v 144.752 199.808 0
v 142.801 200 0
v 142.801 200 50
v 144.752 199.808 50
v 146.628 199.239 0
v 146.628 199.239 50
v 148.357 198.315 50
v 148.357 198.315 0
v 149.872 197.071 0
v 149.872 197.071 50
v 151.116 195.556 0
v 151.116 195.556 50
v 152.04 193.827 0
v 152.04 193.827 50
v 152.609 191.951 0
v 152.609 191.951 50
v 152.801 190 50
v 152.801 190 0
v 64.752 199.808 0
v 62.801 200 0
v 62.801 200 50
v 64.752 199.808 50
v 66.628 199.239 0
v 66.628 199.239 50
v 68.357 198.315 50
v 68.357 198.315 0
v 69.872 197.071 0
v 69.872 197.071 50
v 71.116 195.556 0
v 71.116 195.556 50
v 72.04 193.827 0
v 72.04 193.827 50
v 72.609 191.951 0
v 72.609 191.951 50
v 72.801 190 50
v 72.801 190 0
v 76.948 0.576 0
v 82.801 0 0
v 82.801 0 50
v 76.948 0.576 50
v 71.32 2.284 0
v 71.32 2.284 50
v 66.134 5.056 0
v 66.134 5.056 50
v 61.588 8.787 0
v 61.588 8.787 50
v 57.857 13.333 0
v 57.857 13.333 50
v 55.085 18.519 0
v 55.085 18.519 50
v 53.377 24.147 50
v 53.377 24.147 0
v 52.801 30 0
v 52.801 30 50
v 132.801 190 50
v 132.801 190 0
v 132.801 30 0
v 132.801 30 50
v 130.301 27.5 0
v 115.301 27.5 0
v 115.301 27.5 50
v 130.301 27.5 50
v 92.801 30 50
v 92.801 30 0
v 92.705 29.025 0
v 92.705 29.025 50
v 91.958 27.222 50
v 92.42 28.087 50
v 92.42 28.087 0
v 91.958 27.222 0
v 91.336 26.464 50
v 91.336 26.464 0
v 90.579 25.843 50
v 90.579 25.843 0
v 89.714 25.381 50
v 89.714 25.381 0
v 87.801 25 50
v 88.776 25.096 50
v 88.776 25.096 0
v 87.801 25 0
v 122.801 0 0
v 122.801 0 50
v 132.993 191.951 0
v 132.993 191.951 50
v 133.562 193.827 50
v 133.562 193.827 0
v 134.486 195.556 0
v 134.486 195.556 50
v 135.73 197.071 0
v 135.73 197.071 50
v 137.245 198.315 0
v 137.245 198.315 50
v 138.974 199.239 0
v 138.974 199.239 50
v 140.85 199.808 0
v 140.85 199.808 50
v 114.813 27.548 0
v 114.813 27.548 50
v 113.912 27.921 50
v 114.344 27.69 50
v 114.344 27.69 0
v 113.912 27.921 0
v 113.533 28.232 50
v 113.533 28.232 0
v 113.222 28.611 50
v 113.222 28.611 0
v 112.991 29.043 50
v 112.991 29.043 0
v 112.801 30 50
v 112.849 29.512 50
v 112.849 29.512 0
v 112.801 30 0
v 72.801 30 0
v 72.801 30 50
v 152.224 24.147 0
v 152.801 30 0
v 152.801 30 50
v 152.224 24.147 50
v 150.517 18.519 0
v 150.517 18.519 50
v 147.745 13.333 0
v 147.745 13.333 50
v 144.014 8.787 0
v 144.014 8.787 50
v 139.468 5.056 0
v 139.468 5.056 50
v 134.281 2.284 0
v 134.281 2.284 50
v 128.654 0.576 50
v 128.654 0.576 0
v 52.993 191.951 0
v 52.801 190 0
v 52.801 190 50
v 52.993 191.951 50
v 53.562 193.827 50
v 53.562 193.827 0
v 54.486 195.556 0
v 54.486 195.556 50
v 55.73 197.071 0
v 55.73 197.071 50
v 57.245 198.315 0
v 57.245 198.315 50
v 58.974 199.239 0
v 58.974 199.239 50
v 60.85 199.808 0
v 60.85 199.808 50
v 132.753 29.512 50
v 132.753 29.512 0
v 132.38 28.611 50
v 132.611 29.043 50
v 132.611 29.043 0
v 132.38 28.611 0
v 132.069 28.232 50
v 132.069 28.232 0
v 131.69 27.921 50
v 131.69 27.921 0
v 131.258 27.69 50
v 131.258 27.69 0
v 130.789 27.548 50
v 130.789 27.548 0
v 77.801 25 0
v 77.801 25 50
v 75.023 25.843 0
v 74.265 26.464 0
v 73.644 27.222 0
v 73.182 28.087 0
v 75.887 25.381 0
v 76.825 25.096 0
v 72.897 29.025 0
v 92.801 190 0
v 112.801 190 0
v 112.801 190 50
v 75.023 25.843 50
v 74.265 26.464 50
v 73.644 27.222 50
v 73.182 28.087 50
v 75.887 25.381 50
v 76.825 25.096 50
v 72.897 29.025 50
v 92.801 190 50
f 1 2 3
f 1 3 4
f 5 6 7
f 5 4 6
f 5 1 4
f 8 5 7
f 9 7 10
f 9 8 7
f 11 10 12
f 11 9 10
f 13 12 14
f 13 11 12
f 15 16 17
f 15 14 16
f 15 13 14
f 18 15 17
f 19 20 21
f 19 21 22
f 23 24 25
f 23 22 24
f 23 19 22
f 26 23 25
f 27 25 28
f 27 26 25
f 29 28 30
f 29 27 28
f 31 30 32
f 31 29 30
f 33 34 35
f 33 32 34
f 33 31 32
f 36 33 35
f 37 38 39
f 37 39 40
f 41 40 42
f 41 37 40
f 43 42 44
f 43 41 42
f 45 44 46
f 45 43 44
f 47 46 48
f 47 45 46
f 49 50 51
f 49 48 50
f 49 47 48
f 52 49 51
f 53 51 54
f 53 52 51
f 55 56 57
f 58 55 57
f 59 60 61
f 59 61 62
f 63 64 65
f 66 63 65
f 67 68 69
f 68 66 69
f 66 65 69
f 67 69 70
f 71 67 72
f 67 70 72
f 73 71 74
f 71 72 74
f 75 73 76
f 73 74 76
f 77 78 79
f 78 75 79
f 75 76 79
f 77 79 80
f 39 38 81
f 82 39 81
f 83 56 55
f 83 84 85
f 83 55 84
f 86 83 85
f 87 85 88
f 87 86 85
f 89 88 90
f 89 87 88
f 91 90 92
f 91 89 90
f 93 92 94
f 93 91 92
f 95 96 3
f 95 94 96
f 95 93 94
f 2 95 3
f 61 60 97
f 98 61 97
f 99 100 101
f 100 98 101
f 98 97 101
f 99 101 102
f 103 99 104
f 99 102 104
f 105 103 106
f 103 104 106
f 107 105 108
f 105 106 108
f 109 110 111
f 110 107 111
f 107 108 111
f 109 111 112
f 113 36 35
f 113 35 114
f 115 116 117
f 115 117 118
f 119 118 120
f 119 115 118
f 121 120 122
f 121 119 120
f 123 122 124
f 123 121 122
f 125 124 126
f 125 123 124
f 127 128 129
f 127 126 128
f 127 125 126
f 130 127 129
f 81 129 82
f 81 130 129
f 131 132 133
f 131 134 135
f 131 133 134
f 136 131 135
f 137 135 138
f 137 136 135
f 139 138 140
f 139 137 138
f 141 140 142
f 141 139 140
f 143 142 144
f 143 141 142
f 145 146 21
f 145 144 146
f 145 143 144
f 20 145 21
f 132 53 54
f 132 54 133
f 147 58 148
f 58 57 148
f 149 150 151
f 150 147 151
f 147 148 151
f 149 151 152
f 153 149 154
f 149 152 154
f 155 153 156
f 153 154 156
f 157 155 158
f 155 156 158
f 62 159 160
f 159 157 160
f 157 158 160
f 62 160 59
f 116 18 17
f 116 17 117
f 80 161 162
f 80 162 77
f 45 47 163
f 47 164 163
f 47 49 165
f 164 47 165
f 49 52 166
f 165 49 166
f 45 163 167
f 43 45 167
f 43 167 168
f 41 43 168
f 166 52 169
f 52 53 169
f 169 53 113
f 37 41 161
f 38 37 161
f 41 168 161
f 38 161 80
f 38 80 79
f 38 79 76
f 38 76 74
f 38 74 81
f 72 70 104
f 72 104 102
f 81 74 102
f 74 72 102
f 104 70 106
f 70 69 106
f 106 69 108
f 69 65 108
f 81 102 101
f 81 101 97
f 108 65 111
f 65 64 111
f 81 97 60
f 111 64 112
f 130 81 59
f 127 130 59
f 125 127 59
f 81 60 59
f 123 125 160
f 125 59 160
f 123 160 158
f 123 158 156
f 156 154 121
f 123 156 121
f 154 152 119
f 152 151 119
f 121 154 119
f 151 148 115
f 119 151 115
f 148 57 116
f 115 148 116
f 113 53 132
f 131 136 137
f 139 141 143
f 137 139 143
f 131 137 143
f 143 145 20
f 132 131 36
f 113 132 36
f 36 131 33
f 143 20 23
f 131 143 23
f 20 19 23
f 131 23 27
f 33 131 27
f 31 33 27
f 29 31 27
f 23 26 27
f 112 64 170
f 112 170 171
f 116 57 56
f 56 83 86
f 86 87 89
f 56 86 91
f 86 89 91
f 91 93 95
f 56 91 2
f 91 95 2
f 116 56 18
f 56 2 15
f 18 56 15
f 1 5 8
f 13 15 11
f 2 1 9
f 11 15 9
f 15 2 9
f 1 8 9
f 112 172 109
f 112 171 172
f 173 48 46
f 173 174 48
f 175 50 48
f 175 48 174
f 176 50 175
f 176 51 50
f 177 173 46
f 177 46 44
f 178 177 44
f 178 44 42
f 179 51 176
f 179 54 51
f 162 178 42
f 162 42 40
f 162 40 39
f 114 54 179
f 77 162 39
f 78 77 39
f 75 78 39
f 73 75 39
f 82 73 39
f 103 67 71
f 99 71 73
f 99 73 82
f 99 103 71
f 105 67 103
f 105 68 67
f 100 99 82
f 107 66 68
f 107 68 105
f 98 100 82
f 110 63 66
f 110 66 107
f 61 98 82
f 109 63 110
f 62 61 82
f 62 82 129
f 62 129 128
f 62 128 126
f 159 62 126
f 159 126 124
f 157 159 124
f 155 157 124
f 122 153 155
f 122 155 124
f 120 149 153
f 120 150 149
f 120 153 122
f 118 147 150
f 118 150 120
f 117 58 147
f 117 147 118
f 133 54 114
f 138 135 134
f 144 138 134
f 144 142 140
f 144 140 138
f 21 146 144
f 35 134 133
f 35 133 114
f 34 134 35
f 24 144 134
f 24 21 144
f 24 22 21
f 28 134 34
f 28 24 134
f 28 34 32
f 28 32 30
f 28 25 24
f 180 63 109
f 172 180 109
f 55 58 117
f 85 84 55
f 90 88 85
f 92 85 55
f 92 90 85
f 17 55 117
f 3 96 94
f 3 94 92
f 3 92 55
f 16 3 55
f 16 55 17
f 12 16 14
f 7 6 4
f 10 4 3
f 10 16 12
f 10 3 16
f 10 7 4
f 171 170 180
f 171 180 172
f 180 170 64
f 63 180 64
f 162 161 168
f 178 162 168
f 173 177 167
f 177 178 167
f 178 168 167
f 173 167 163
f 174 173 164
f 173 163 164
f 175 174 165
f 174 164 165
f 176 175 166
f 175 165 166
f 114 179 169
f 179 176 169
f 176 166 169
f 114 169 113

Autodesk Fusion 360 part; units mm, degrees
sketch "Sketch1" plane through (0, 0, 0) normal (0, 0, 1) x (1, 0, 0)
  line L0 (0, 0) -> (200, 0)
  line L1 (200, 0) -> (200, 200)
  line L2 (200, 200) -> (0, 200)
  line L3 (0, 200) -> (0, 0)
  line L4 (52.8009, 30) -> (52.8009, 190)
  line L5 (72.8009, 190) -> (72.8009, 30)
  line L6 (112.8009, 190) -> (112.8009, 30)
  line L7 (132.8009, 190) -> (132.8009, 30)
  line L8 (152.8009, 190) -> (152.8009, 30)
  line L9 (52.8009, 190) -> (152.8009, 190) construction
  arc A0 (72.8009, 190) -> (52.8009, 190) centre (62.8009, 190) ccw
  arc A1 (152.8009, 190) -> (132.8009, 190) centre (142.8009, 190) ccw
  line L10 (92.8009, 190) -> (92.8009, 30)
  arc A2 (72.8009, 30) -> (92.8009, 30) centre (82.8009, 30) ccw construction
  arc A3 (112.8009, 30) -> (132.8009, 30) centre (122.8009, 30) ccw construction
  arc A4 (112.8009, 190) -> (92.8009, 190) centre (102.8009, 190) ccw construction
  arc A5 (52.8009, 30) -> (82.8009, 0) centre (82.8009, 30) ccw
  line L11 (92.8009, 190) -> (112.8009, 190)
  arc A6 (72.8009, 30) -> (77.8009, 25) centre (77.8009, 30) ccw
  arc A7 (87.8009, 25) -> (92.8009, 30) centre (87.8009, 30) ccw
  arc A8 (112.8009, 30) -> (115.3009, 27.5) centre (115.3009, 30) ccw
  arc A9 (130.3009, 27.5) -> (132.8009, 30) centre (130.3009, 30) ccw
  line L12 (77.8009, 25) -> (87.8009, 25)
  line L13 (115.3009, 27.5) -> (130.3009, 27.5)
  line L14 (82.8009, 0) -> (122.8009, 0)
  line L15 (52.8009, 30) -> (152.8009, 30) construction
  arc A10 (122.8009, 0) -> (152.8009, 30) centre (122.8009, 30) ccw
  dimension "d1" = 200
  dimension "d2" = 200
  dimension "d3" = 20
  dimension "d4" = 5
  dimension "d5" = 2.5
  dimension "d6" = 62.8009
extrude "Extrude2" add sketch "Sketch1" along normal blind 50 contours L0 L4 L5 L6 L7 L8 A0 A1 L10 A5 L11 A6 A7 A8 A9 L12 L13 L14 A10
